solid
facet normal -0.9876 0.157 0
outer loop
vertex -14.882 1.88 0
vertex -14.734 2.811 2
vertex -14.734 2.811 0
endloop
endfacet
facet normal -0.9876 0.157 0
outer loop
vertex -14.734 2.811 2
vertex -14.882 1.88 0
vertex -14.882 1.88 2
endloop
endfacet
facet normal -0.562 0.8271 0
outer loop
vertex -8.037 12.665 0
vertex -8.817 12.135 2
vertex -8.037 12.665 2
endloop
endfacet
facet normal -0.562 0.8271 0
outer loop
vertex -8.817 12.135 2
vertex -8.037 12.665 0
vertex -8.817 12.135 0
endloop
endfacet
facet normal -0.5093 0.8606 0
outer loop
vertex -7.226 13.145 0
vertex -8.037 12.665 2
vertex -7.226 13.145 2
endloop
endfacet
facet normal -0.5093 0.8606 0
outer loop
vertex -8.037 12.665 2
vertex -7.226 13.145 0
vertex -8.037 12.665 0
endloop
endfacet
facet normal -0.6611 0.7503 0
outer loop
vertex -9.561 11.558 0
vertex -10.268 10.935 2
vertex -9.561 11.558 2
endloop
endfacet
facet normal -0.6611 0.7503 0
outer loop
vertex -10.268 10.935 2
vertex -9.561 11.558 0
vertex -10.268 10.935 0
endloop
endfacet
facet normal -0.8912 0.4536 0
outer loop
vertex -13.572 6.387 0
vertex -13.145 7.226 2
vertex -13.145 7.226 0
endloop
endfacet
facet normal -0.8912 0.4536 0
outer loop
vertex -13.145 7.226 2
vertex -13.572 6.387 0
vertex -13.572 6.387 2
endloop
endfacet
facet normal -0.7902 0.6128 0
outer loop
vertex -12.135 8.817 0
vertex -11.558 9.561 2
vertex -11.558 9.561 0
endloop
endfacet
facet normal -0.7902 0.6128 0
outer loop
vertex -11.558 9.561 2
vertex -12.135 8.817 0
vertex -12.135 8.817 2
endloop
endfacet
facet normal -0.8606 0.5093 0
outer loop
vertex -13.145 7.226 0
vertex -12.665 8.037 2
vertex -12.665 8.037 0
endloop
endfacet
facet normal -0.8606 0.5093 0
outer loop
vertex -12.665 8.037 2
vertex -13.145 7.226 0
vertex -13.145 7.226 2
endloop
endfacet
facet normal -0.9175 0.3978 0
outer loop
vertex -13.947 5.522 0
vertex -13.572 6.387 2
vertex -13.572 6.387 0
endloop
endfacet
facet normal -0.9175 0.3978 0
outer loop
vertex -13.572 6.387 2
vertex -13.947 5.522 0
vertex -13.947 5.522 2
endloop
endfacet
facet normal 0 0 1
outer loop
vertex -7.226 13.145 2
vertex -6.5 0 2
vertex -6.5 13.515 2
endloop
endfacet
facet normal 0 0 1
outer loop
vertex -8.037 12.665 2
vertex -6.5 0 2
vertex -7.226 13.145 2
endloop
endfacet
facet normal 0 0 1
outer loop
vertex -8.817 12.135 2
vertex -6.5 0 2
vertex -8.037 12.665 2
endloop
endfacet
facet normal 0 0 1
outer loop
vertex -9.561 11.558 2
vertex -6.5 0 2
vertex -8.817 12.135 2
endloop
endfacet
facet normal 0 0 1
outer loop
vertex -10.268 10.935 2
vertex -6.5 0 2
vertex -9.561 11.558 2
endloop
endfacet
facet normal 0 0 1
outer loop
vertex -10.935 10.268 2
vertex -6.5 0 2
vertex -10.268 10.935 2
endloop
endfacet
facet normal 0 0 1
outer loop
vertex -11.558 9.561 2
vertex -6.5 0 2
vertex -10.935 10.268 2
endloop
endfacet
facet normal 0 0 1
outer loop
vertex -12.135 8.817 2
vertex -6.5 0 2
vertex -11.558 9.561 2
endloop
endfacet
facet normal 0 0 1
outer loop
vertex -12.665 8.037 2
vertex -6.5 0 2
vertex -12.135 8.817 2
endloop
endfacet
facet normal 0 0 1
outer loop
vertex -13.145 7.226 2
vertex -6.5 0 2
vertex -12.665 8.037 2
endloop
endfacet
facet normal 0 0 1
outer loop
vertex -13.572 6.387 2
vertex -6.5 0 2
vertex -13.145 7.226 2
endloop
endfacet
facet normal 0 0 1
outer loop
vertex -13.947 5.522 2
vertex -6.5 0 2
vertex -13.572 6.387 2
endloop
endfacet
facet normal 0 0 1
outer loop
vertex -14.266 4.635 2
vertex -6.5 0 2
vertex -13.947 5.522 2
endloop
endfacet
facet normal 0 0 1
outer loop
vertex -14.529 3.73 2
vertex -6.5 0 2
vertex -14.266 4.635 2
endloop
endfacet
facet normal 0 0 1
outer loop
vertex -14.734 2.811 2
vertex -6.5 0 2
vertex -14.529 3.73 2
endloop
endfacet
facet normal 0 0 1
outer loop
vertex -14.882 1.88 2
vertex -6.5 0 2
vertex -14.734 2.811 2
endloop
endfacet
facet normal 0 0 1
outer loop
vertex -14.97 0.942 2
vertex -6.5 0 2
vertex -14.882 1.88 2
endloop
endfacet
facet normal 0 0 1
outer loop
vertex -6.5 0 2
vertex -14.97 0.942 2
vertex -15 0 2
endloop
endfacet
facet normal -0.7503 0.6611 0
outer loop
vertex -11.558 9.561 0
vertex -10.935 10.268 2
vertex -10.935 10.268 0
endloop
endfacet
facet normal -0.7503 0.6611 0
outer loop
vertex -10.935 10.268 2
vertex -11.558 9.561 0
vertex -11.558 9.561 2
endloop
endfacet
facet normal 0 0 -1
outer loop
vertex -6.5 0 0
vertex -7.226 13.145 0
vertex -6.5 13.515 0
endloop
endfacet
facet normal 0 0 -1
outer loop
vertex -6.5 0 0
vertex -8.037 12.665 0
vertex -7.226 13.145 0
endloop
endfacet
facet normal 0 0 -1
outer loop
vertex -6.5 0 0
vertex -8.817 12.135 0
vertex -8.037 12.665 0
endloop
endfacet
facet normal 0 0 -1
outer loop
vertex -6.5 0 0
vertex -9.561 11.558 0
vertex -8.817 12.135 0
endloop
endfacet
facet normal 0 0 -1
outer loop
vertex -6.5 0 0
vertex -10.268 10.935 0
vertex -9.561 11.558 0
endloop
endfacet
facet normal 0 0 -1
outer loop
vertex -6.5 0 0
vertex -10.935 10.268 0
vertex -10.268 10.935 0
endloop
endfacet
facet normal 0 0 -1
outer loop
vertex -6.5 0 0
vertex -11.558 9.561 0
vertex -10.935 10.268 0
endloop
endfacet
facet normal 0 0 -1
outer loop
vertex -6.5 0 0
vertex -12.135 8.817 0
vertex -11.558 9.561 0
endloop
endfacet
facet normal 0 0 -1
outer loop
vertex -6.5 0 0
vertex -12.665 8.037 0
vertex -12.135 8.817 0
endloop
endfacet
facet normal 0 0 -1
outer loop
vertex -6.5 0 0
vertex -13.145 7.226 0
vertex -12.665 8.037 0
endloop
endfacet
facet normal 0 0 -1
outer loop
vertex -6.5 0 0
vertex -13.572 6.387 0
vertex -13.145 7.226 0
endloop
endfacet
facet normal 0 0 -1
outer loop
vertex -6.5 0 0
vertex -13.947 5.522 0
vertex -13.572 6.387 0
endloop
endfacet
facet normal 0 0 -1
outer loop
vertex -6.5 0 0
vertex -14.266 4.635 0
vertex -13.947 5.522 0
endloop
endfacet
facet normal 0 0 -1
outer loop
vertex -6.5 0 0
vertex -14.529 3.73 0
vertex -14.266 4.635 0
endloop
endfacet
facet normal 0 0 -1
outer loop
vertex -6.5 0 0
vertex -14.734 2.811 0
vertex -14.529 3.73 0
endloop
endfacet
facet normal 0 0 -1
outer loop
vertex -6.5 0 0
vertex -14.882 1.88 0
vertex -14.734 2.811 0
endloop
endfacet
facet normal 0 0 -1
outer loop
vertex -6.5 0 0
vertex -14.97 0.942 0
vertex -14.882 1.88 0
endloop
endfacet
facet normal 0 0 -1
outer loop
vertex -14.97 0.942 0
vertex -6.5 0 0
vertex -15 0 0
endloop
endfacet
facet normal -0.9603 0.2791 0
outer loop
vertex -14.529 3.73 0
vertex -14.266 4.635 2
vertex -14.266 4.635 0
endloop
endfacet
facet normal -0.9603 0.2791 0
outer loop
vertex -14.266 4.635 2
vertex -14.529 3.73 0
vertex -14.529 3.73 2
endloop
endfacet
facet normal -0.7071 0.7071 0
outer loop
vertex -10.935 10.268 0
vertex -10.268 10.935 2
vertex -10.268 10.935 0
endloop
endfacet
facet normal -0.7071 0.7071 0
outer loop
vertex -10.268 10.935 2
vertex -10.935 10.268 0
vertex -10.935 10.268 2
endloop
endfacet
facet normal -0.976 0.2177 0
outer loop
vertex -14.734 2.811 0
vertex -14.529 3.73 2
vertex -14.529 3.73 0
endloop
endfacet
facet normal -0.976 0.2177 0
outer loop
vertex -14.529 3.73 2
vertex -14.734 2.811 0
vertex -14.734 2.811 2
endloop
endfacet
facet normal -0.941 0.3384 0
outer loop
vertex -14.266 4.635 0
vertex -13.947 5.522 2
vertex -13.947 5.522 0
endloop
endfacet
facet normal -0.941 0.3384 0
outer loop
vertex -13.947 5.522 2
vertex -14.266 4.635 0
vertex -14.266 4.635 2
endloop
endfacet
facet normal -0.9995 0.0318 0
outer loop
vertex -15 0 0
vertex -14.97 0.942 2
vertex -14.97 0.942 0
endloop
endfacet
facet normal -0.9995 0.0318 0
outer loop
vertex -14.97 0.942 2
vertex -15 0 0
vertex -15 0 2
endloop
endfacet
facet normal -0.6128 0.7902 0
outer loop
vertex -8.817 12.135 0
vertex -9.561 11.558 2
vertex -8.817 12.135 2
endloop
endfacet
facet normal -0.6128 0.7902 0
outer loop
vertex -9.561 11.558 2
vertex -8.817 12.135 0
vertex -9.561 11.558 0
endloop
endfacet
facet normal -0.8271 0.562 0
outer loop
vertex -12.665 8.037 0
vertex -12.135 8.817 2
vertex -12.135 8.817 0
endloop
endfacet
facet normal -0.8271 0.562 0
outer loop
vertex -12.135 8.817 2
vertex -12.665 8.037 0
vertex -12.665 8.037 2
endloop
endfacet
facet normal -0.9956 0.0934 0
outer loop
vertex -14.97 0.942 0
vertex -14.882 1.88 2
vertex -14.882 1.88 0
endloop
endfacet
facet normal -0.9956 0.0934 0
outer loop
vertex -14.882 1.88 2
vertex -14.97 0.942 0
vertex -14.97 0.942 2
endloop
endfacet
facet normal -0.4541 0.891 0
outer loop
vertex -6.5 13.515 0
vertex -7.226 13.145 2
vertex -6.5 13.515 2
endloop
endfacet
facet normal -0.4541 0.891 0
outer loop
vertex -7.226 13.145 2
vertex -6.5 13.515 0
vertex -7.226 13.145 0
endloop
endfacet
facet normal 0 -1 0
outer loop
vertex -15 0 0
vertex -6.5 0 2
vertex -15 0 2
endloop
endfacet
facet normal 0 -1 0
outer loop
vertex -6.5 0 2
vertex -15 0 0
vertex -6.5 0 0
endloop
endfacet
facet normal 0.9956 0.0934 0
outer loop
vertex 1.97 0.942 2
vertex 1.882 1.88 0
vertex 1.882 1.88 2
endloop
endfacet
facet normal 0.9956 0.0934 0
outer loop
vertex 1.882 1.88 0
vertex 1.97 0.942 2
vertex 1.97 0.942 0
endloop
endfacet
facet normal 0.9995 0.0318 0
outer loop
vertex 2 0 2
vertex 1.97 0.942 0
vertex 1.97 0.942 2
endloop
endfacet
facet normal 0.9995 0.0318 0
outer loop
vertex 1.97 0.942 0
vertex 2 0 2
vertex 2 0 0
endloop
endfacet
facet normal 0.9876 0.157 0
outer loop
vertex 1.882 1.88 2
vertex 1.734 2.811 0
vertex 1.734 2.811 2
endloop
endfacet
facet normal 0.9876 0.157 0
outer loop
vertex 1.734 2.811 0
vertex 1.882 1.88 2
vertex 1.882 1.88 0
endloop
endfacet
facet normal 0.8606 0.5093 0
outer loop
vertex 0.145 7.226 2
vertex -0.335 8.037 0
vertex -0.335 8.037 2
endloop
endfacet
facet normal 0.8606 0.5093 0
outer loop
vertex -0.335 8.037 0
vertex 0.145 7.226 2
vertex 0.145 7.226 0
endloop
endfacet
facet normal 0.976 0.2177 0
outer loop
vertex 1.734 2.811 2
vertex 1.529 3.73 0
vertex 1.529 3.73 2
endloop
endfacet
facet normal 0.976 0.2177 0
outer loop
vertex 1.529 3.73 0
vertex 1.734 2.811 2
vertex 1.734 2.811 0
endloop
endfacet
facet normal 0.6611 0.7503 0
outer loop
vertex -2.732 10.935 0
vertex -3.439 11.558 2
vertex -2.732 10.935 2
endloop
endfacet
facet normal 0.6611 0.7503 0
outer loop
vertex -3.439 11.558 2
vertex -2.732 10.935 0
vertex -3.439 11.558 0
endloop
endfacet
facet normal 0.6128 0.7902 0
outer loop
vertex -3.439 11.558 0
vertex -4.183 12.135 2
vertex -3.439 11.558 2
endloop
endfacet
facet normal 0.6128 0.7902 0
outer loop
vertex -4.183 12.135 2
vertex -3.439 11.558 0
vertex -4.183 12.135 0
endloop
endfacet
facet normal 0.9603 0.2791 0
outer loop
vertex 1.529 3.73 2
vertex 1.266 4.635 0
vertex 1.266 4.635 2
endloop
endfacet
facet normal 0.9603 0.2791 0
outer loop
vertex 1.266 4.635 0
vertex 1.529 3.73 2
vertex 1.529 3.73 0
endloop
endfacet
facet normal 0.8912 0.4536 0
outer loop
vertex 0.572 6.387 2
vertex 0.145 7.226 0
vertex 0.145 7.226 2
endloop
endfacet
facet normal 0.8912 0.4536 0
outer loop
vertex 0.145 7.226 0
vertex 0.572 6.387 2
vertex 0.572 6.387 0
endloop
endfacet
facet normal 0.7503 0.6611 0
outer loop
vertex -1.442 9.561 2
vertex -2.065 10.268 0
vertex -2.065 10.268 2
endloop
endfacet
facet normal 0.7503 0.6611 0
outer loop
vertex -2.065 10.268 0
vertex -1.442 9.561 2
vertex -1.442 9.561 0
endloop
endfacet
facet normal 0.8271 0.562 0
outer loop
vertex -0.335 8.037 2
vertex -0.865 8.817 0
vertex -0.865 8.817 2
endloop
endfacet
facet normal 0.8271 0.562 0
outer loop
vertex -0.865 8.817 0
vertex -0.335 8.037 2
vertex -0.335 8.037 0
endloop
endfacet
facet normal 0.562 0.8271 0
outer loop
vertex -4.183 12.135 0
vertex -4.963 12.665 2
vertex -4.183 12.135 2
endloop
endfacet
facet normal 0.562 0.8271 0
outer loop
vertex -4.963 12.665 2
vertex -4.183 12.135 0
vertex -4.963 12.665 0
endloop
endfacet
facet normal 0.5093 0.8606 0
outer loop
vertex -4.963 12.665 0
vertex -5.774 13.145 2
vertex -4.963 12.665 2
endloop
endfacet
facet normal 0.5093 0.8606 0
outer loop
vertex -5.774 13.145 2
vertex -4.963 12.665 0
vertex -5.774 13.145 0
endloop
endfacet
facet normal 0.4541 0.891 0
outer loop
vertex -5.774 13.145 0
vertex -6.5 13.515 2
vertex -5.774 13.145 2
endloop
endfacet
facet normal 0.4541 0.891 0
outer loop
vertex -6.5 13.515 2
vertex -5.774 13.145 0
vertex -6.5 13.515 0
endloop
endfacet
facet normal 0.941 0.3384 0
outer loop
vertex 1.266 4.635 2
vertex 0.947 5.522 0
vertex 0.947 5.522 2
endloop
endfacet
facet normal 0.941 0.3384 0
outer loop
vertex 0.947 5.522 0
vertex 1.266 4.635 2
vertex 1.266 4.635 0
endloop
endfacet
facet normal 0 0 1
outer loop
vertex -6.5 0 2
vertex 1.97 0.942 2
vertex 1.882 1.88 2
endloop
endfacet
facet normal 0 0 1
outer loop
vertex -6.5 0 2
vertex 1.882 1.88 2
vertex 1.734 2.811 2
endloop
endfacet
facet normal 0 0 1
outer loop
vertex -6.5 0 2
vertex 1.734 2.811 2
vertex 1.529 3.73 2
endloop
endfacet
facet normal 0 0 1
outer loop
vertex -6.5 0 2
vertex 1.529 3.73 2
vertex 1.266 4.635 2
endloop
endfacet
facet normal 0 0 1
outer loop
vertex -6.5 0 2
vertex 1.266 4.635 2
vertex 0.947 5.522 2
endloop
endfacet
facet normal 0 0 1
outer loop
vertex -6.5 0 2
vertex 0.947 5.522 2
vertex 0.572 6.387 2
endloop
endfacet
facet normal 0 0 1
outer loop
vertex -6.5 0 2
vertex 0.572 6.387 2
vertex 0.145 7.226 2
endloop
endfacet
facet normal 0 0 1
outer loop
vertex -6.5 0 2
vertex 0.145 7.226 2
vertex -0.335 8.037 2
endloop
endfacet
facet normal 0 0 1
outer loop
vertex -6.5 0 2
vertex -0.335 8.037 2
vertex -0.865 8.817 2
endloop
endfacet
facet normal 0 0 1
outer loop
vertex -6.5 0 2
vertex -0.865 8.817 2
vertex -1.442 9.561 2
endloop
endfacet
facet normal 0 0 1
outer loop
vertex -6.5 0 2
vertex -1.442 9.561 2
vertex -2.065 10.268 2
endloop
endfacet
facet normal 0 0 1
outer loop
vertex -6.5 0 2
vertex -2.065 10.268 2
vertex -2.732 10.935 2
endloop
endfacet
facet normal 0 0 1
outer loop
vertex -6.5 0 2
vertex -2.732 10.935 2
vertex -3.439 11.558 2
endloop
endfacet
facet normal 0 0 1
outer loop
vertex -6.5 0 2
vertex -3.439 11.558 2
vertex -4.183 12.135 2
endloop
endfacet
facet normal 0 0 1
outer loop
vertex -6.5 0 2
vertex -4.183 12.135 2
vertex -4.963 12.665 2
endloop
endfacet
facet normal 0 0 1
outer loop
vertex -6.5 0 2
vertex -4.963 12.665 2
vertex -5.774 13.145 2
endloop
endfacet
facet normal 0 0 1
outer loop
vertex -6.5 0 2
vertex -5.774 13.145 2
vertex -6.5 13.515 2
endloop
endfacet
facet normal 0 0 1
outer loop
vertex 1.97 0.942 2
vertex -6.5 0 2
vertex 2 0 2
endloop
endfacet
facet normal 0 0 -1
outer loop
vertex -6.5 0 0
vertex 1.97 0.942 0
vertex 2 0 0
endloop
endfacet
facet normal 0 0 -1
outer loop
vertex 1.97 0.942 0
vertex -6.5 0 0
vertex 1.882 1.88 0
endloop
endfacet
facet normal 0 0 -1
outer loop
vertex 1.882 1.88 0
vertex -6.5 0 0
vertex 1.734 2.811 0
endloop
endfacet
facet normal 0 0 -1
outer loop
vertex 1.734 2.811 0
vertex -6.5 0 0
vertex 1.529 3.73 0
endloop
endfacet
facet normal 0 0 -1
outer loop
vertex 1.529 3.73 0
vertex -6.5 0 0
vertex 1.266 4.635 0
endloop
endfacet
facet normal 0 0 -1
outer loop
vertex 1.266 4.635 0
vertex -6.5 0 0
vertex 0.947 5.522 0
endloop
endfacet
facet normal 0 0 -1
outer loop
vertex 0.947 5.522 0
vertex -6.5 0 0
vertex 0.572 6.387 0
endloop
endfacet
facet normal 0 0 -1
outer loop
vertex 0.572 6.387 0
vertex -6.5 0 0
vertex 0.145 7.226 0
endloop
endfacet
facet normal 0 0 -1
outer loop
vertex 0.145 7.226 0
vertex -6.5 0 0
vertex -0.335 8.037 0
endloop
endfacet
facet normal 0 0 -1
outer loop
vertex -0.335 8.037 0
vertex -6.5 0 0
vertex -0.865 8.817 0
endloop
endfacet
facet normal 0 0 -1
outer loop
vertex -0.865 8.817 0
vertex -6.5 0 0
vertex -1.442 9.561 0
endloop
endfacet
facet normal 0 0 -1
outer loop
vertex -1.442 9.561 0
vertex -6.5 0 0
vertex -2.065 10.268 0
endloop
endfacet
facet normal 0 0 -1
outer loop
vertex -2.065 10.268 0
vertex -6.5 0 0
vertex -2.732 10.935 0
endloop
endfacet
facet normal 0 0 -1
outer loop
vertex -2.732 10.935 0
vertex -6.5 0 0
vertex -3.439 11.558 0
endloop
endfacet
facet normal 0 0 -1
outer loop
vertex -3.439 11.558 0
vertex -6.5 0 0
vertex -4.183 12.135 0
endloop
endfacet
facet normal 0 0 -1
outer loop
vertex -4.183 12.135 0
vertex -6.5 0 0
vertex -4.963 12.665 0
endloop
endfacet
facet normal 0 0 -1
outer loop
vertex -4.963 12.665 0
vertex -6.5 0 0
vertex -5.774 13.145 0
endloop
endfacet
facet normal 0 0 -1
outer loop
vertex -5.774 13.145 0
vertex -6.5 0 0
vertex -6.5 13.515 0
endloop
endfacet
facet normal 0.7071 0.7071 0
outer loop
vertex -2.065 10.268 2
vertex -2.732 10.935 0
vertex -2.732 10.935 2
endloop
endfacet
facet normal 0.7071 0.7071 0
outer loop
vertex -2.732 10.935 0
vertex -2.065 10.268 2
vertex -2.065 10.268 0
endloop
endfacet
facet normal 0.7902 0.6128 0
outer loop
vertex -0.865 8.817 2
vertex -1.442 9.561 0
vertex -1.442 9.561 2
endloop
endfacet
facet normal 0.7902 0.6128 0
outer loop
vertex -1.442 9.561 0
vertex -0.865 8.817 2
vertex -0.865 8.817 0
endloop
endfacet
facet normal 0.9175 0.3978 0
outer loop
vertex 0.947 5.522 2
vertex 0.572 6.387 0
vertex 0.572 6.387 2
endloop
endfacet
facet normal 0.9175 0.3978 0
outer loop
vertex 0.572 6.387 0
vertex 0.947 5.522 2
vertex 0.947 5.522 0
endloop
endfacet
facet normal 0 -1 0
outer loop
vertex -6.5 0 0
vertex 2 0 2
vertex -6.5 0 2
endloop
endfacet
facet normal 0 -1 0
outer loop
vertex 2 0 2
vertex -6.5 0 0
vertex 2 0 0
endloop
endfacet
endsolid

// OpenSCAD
union(){
	difference() {
		// left half
		cylinder(h = 2, r =15, $fn = 100);

		translate([-15,-30,0])
		cube([30,30,2]);
	
		translate([-6.5,0,0])
		cube([21.5,15,2]);
	}

	translate([-13,0,0])
	difference() {
		// right half
		cylinder(h = 2, r =15, $fn = 100);

		translate([-15,-30,0])
		cube([30,30,2]);

		translate([-15,0,0])
		cube([21.5,15,2]);
	}
}
